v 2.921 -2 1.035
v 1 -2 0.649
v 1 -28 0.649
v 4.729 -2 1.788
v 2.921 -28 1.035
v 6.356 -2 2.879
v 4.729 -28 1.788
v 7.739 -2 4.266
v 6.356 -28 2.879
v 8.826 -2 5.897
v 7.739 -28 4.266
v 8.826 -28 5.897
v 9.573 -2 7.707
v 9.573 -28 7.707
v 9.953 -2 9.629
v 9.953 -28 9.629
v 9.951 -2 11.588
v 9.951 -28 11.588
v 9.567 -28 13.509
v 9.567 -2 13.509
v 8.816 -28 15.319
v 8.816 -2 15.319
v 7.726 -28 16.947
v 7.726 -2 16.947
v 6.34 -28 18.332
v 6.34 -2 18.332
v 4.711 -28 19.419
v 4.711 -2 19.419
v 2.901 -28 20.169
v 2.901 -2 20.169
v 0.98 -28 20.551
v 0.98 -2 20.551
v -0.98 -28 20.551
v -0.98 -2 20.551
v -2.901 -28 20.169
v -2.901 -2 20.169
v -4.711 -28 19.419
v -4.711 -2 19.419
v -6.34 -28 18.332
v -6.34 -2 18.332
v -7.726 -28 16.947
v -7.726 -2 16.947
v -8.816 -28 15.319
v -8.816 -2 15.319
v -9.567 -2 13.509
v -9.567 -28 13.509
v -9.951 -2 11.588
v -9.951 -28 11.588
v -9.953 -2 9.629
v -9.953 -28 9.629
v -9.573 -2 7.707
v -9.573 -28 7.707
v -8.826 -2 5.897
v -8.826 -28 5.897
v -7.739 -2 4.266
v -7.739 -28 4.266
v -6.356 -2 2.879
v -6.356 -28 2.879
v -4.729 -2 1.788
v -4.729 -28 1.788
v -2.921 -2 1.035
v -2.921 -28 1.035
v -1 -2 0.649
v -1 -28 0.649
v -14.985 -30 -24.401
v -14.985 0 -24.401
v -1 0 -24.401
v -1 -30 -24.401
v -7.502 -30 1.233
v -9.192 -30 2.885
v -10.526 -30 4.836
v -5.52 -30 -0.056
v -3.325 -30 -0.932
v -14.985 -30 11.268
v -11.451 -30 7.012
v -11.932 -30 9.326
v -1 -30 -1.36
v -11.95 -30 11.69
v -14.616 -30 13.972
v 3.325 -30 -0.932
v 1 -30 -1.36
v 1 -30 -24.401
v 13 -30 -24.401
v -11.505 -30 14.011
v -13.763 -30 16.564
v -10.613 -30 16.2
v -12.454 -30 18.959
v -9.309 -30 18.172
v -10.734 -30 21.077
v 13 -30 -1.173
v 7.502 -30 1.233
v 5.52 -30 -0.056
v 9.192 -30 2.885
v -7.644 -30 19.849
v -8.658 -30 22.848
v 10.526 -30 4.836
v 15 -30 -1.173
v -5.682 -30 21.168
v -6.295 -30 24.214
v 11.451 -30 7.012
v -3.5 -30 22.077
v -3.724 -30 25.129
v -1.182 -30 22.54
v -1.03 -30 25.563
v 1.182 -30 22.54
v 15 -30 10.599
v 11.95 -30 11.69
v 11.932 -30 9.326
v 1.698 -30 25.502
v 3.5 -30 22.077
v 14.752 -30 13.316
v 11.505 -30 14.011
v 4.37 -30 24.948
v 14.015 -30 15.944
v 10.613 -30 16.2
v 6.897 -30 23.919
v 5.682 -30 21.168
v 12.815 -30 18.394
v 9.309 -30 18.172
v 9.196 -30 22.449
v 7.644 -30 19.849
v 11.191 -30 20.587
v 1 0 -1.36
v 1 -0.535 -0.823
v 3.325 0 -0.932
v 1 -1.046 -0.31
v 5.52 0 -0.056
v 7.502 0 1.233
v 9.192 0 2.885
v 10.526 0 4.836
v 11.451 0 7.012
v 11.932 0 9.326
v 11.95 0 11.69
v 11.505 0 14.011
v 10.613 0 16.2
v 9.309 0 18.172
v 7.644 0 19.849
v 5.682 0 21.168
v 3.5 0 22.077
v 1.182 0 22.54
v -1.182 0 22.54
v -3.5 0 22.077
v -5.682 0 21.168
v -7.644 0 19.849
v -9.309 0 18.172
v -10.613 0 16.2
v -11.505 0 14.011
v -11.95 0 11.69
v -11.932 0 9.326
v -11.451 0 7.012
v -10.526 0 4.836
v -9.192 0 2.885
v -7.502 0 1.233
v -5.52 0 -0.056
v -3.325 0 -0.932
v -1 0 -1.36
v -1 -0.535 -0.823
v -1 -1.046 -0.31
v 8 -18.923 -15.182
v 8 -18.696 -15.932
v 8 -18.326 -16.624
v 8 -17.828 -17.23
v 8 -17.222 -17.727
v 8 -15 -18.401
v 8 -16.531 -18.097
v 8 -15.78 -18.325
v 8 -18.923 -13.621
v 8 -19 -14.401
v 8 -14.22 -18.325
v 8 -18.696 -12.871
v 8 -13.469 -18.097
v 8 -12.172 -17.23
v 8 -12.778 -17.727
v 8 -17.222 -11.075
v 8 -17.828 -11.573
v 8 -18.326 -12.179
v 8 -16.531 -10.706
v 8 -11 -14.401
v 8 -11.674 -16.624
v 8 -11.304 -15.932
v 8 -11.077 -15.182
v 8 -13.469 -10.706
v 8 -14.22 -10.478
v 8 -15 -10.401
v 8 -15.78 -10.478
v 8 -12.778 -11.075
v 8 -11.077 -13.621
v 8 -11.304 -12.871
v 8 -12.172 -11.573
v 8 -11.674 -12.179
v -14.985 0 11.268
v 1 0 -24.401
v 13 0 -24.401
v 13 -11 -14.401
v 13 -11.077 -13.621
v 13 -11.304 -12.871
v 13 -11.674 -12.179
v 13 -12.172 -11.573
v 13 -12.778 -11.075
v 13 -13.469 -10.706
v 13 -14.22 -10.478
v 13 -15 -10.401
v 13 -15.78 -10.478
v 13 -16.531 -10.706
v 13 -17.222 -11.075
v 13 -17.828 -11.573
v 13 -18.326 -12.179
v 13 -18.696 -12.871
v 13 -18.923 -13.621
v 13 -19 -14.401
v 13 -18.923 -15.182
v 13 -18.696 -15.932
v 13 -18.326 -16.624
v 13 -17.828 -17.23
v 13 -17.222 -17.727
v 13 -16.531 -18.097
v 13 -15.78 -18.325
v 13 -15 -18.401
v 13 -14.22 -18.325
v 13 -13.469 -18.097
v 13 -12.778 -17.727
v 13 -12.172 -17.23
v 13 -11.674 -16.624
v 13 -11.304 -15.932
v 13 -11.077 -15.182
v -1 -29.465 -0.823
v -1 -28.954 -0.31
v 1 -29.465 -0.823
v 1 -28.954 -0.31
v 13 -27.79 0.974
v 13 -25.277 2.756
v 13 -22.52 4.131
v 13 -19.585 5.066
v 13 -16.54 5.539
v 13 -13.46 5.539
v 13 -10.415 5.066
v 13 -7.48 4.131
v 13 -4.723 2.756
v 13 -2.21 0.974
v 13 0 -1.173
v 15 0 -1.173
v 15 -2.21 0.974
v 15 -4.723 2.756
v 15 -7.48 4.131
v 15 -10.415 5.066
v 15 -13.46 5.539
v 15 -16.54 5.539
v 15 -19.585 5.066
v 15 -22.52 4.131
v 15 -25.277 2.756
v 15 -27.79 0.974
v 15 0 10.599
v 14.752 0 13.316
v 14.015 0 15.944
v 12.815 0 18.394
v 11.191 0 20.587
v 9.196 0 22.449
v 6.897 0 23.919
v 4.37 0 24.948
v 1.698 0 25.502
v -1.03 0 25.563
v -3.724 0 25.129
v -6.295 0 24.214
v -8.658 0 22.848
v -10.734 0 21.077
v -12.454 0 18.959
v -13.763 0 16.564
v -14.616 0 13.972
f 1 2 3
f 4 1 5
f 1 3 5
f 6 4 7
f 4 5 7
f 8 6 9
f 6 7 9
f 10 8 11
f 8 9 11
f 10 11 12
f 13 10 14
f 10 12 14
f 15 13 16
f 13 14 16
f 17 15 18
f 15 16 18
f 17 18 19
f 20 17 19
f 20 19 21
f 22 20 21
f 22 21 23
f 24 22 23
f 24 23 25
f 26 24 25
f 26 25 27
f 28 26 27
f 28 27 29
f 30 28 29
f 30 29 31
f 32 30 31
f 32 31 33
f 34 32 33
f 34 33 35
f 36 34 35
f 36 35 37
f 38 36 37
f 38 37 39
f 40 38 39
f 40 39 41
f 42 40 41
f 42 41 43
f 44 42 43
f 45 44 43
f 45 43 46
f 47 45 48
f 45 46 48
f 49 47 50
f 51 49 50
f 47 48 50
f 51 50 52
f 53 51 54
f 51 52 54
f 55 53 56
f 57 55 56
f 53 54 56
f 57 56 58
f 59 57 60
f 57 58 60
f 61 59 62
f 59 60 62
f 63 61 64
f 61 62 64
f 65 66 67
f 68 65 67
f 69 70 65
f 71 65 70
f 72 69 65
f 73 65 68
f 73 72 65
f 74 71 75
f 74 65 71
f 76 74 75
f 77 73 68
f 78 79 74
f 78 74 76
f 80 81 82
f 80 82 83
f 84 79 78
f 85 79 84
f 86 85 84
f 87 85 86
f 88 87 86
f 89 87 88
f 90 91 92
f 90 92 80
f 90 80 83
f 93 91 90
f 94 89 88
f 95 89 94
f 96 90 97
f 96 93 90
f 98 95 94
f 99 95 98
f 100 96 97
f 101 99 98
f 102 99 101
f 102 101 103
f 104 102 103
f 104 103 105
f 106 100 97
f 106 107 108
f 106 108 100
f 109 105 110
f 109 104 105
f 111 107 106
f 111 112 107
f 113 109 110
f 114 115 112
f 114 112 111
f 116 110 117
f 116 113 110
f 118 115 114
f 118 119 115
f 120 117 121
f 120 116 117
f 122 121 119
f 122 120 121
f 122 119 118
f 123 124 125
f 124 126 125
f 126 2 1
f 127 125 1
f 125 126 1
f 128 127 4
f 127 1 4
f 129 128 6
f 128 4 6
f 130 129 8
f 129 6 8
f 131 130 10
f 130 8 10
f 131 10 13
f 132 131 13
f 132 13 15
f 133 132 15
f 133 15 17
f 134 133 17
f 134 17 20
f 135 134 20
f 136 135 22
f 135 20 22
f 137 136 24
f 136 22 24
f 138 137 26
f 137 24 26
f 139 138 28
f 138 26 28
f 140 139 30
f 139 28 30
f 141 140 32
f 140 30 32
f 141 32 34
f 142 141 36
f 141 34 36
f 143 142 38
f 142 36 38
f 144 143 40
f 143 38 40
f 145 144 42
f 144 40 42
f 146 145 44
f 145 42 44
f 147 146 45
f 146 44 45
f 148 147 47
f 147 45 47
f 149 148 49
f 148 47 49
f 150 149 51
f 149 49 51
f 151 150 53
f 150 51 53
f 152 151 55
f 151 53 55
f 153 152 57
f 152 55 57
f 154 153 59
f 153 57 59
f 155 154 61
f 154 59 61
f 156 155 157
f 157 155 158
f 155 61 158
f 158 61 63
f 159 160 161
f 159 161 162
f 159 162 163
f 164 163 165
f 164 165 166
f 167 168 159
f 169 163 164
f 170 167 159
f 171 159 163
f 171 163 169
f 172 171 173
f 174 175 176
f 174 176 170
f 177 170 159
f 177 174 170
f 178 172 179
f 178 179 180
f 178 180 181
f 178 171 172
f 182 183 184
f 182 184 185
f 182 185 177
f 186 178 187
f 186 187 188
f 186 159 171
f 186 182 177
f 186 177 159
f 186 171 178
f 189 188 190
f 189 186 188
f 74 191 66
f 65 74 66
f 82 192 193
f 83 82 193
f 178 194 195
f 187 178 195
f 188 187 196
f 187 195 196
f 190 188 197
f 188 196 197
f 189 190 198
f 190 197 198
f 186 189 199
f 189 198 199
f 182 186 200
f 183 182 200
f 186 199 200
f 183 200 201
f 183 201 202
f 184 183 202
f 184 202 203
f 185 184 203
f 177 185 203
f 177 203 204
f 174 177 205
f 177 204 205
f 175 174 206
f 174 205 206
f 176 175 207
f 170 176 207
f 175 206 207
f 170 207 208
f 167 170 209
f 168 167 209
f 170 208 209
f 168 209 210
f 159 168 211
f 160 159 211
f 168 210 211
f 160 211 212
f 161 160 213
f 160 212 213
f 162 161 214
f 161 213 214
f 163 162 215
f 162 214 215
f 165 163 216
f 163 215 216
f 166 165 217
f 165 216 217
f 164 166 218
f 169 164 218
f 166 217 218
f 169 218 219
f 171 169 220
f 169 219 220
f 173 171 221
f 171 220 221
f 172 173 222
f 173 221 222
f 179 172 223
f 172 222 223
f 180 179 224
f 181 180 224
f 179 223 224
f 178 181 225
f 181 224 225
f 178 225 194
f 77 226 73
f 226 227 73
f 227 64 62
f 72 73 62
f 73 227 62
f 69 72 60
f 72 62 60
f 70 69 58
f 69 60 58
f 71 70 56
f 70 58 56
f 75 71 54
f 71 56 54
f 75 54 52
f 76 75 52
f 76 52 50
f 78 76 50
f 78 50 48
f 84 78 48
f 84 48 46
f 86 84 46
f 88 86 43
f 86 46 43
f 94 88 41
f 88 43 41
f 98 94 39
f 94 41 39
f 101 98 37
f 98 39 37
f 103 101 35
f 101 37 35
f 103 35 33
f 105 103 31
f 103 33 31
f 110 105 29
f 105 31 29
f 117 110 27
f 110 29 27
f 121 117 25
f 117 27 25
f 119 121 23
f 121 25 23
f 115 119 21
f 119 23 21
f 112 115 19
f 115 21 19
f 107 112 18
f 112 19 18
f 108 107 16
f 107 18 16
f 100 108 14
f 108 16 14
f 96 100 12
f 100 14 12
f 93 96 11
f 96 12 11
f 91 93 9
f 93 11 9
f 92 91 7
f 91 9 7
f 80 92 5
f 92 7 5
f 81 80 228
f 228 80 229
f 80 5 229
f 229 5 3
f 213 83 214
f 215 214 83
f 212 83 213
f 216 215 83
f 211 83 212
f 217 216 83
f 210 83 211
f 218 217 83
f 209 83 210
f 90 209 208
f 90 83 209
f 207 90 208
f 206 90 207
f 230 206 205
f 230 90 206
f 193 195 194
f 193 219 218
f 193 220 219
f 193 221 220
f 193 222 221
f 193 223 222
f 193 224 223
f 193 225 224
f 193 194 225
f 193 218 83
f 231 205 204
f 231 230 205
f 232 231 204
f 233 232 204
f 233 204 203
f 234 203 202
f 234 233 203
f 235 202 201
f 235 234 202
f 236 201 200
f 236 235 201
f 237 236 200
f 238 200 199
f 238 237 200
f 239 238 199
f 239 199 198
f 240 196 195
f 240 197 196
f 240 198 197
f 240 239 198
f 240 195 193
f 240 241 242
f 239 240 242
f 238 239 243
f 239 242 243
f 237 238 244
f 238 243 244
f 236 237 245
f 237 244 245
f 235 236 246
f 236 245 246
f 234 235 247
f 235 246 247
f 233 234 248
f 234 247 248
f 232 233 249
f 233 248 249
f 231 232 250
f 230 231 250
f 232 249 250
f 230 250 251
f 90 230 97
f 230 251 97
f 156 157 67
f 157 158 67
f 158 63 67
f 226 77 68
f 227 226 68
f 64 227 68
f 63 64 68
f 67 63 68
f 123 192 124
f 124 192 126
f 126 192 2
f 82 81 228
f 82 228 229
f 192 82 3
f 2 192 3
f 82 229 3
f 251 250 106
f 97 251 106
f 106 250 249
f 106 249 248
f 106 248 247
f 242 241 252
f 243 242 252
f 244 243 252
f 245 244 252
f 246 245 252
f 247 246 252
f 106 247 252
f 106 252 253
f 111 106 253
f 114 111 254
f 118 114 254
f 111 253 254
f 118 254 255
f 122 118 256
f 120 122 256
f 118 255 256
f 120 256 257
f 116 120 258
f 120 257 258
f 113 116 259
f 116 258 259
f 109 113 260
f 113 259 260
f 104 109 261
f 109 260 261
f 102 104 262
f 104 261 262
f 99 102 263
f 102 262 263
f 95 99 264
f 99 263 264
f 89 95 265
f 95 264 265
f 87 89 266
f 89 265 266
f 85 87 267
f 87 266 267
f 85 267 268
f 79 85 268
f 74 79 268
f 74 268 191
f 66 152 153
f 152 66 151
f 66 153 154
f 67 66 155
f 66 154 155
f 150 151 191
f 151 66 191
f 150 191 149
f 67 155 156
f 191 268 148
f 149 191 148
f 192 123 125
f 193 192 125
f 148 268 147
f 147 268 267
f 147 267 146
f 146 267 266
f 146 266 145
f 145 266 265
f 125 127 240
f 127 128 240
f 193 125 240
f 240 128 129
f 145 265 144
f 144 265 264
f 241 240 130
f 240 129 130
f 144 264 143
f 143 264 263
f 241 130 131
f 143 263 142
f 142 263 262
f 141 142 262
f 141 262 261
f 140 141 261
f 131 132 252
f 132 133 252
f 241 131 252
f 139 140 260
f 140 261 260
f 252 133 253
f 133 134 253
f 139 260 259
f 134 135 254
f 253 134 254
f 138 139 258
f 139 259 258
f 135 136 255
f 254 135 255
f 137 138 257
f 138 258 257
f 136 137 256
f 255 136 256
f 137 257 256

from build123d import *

# Parameters (mm, degrees)
F1_DEPTH  = 30
F2_R      = 10
F3_DEPTH  = 30.001
F5_DEPTH  = 30.001
F7_DEPTH  = 2
F8_R      = 4
F9_DEPTH  = 5
F10_SIZE2 = 2
F10_SIZE  = 2


with BuildPart() as f1:
    # F0 (on Front) → F1 (new body)
    with BuildSketch(Plane.XZ):
        with BuildLine():
            Line((-14.9850390488, 11.2684052181), (-14.9850390488, -24.4013743764))
            Line((-14.9850390488, -24.4013743764), (-0.9850390488, -24.4013743764))
            Line((-0.9850390488, -24.4013743764), (1, -24.4013743764))
            Line((1, -24.4013743764), (15, -24.4013743764))
            Line((15, -24.4013743764), (15, 10.5986256236))
            ThreePointArc((15, 10.5986256236), (0.334973333, 25.5948849194), (-14.9850390488, 11.2684052181))
        make_face()
    extrude(amount=F1_DEPTH)

    # F2 (on face) → F3 (cut, through all)
    with BuildSketch(Plane.XZ.offset(30)):
        with Locations((0, 10.5986256236)):
            Circle(F2_R)
    extrude(amount=-F3_DEPTH, mode=Mode.SUBTRACT)

    # F4 (on face) → F5 (cut, through all)
    with BuildSketch(Plane.XZ.offset(30)):
        with BuildLine():
            Line((-1, -24.4013743764), (0, -24.4013743764))
            Line((0, -24.4013743764), (1, -24.4013743764))
            Line((1, -24.4013743764), (1, 0.6487512526))
            ThreePointArc((1, 0.6487512526), (0, 0.5986256236), (-1, 0.6487512526))
            Line((-1, 0.6487512526), (-1, -24.4013743764))
        make_face()
    extrude(amount=-F5_DEPTH, mode=Mode.SUBTRACT)

    # F6 (on face) → F7 (cut)
    with BuildSketch(Plane.YZ.offset(15)):
        with BuildLine():
            Line((0, -24.4013743764), (0, -1.172617821))
            ThreePointArc((0, -1.172617821), (-15, 5.5986256236), (-30, -1.172617821))
            Line((-30, -1.172617821), (-30, -24.4013743764))
            Line((-30, -24.4013743764), (0, -24.4013743764))
        make_face()
    extrude(amount=-F7_DEPTH, mode=Mode.SUBTRACT)

    # F8 (on face) → F9 (cut, symmetric)
    with BuildSketch(Plane.YZ.offset(13)):
        with Locations((-15, -14.4013743764)):
            Circle(F8_R)
    extrude(amount=F9_DEPTH, both=True, mode=Mode.SUBTRACT)

    # F10
    f10_edges = [f1.edges().sort_by_distance(p)[0] for p in [
        (0, -30, 20.598626),
        (0, 0, 20.598626),
    ]]
    chamfer(f10_edges, length=F10_SIZE, length2=F10_SIZE2)


solid = f1.part
